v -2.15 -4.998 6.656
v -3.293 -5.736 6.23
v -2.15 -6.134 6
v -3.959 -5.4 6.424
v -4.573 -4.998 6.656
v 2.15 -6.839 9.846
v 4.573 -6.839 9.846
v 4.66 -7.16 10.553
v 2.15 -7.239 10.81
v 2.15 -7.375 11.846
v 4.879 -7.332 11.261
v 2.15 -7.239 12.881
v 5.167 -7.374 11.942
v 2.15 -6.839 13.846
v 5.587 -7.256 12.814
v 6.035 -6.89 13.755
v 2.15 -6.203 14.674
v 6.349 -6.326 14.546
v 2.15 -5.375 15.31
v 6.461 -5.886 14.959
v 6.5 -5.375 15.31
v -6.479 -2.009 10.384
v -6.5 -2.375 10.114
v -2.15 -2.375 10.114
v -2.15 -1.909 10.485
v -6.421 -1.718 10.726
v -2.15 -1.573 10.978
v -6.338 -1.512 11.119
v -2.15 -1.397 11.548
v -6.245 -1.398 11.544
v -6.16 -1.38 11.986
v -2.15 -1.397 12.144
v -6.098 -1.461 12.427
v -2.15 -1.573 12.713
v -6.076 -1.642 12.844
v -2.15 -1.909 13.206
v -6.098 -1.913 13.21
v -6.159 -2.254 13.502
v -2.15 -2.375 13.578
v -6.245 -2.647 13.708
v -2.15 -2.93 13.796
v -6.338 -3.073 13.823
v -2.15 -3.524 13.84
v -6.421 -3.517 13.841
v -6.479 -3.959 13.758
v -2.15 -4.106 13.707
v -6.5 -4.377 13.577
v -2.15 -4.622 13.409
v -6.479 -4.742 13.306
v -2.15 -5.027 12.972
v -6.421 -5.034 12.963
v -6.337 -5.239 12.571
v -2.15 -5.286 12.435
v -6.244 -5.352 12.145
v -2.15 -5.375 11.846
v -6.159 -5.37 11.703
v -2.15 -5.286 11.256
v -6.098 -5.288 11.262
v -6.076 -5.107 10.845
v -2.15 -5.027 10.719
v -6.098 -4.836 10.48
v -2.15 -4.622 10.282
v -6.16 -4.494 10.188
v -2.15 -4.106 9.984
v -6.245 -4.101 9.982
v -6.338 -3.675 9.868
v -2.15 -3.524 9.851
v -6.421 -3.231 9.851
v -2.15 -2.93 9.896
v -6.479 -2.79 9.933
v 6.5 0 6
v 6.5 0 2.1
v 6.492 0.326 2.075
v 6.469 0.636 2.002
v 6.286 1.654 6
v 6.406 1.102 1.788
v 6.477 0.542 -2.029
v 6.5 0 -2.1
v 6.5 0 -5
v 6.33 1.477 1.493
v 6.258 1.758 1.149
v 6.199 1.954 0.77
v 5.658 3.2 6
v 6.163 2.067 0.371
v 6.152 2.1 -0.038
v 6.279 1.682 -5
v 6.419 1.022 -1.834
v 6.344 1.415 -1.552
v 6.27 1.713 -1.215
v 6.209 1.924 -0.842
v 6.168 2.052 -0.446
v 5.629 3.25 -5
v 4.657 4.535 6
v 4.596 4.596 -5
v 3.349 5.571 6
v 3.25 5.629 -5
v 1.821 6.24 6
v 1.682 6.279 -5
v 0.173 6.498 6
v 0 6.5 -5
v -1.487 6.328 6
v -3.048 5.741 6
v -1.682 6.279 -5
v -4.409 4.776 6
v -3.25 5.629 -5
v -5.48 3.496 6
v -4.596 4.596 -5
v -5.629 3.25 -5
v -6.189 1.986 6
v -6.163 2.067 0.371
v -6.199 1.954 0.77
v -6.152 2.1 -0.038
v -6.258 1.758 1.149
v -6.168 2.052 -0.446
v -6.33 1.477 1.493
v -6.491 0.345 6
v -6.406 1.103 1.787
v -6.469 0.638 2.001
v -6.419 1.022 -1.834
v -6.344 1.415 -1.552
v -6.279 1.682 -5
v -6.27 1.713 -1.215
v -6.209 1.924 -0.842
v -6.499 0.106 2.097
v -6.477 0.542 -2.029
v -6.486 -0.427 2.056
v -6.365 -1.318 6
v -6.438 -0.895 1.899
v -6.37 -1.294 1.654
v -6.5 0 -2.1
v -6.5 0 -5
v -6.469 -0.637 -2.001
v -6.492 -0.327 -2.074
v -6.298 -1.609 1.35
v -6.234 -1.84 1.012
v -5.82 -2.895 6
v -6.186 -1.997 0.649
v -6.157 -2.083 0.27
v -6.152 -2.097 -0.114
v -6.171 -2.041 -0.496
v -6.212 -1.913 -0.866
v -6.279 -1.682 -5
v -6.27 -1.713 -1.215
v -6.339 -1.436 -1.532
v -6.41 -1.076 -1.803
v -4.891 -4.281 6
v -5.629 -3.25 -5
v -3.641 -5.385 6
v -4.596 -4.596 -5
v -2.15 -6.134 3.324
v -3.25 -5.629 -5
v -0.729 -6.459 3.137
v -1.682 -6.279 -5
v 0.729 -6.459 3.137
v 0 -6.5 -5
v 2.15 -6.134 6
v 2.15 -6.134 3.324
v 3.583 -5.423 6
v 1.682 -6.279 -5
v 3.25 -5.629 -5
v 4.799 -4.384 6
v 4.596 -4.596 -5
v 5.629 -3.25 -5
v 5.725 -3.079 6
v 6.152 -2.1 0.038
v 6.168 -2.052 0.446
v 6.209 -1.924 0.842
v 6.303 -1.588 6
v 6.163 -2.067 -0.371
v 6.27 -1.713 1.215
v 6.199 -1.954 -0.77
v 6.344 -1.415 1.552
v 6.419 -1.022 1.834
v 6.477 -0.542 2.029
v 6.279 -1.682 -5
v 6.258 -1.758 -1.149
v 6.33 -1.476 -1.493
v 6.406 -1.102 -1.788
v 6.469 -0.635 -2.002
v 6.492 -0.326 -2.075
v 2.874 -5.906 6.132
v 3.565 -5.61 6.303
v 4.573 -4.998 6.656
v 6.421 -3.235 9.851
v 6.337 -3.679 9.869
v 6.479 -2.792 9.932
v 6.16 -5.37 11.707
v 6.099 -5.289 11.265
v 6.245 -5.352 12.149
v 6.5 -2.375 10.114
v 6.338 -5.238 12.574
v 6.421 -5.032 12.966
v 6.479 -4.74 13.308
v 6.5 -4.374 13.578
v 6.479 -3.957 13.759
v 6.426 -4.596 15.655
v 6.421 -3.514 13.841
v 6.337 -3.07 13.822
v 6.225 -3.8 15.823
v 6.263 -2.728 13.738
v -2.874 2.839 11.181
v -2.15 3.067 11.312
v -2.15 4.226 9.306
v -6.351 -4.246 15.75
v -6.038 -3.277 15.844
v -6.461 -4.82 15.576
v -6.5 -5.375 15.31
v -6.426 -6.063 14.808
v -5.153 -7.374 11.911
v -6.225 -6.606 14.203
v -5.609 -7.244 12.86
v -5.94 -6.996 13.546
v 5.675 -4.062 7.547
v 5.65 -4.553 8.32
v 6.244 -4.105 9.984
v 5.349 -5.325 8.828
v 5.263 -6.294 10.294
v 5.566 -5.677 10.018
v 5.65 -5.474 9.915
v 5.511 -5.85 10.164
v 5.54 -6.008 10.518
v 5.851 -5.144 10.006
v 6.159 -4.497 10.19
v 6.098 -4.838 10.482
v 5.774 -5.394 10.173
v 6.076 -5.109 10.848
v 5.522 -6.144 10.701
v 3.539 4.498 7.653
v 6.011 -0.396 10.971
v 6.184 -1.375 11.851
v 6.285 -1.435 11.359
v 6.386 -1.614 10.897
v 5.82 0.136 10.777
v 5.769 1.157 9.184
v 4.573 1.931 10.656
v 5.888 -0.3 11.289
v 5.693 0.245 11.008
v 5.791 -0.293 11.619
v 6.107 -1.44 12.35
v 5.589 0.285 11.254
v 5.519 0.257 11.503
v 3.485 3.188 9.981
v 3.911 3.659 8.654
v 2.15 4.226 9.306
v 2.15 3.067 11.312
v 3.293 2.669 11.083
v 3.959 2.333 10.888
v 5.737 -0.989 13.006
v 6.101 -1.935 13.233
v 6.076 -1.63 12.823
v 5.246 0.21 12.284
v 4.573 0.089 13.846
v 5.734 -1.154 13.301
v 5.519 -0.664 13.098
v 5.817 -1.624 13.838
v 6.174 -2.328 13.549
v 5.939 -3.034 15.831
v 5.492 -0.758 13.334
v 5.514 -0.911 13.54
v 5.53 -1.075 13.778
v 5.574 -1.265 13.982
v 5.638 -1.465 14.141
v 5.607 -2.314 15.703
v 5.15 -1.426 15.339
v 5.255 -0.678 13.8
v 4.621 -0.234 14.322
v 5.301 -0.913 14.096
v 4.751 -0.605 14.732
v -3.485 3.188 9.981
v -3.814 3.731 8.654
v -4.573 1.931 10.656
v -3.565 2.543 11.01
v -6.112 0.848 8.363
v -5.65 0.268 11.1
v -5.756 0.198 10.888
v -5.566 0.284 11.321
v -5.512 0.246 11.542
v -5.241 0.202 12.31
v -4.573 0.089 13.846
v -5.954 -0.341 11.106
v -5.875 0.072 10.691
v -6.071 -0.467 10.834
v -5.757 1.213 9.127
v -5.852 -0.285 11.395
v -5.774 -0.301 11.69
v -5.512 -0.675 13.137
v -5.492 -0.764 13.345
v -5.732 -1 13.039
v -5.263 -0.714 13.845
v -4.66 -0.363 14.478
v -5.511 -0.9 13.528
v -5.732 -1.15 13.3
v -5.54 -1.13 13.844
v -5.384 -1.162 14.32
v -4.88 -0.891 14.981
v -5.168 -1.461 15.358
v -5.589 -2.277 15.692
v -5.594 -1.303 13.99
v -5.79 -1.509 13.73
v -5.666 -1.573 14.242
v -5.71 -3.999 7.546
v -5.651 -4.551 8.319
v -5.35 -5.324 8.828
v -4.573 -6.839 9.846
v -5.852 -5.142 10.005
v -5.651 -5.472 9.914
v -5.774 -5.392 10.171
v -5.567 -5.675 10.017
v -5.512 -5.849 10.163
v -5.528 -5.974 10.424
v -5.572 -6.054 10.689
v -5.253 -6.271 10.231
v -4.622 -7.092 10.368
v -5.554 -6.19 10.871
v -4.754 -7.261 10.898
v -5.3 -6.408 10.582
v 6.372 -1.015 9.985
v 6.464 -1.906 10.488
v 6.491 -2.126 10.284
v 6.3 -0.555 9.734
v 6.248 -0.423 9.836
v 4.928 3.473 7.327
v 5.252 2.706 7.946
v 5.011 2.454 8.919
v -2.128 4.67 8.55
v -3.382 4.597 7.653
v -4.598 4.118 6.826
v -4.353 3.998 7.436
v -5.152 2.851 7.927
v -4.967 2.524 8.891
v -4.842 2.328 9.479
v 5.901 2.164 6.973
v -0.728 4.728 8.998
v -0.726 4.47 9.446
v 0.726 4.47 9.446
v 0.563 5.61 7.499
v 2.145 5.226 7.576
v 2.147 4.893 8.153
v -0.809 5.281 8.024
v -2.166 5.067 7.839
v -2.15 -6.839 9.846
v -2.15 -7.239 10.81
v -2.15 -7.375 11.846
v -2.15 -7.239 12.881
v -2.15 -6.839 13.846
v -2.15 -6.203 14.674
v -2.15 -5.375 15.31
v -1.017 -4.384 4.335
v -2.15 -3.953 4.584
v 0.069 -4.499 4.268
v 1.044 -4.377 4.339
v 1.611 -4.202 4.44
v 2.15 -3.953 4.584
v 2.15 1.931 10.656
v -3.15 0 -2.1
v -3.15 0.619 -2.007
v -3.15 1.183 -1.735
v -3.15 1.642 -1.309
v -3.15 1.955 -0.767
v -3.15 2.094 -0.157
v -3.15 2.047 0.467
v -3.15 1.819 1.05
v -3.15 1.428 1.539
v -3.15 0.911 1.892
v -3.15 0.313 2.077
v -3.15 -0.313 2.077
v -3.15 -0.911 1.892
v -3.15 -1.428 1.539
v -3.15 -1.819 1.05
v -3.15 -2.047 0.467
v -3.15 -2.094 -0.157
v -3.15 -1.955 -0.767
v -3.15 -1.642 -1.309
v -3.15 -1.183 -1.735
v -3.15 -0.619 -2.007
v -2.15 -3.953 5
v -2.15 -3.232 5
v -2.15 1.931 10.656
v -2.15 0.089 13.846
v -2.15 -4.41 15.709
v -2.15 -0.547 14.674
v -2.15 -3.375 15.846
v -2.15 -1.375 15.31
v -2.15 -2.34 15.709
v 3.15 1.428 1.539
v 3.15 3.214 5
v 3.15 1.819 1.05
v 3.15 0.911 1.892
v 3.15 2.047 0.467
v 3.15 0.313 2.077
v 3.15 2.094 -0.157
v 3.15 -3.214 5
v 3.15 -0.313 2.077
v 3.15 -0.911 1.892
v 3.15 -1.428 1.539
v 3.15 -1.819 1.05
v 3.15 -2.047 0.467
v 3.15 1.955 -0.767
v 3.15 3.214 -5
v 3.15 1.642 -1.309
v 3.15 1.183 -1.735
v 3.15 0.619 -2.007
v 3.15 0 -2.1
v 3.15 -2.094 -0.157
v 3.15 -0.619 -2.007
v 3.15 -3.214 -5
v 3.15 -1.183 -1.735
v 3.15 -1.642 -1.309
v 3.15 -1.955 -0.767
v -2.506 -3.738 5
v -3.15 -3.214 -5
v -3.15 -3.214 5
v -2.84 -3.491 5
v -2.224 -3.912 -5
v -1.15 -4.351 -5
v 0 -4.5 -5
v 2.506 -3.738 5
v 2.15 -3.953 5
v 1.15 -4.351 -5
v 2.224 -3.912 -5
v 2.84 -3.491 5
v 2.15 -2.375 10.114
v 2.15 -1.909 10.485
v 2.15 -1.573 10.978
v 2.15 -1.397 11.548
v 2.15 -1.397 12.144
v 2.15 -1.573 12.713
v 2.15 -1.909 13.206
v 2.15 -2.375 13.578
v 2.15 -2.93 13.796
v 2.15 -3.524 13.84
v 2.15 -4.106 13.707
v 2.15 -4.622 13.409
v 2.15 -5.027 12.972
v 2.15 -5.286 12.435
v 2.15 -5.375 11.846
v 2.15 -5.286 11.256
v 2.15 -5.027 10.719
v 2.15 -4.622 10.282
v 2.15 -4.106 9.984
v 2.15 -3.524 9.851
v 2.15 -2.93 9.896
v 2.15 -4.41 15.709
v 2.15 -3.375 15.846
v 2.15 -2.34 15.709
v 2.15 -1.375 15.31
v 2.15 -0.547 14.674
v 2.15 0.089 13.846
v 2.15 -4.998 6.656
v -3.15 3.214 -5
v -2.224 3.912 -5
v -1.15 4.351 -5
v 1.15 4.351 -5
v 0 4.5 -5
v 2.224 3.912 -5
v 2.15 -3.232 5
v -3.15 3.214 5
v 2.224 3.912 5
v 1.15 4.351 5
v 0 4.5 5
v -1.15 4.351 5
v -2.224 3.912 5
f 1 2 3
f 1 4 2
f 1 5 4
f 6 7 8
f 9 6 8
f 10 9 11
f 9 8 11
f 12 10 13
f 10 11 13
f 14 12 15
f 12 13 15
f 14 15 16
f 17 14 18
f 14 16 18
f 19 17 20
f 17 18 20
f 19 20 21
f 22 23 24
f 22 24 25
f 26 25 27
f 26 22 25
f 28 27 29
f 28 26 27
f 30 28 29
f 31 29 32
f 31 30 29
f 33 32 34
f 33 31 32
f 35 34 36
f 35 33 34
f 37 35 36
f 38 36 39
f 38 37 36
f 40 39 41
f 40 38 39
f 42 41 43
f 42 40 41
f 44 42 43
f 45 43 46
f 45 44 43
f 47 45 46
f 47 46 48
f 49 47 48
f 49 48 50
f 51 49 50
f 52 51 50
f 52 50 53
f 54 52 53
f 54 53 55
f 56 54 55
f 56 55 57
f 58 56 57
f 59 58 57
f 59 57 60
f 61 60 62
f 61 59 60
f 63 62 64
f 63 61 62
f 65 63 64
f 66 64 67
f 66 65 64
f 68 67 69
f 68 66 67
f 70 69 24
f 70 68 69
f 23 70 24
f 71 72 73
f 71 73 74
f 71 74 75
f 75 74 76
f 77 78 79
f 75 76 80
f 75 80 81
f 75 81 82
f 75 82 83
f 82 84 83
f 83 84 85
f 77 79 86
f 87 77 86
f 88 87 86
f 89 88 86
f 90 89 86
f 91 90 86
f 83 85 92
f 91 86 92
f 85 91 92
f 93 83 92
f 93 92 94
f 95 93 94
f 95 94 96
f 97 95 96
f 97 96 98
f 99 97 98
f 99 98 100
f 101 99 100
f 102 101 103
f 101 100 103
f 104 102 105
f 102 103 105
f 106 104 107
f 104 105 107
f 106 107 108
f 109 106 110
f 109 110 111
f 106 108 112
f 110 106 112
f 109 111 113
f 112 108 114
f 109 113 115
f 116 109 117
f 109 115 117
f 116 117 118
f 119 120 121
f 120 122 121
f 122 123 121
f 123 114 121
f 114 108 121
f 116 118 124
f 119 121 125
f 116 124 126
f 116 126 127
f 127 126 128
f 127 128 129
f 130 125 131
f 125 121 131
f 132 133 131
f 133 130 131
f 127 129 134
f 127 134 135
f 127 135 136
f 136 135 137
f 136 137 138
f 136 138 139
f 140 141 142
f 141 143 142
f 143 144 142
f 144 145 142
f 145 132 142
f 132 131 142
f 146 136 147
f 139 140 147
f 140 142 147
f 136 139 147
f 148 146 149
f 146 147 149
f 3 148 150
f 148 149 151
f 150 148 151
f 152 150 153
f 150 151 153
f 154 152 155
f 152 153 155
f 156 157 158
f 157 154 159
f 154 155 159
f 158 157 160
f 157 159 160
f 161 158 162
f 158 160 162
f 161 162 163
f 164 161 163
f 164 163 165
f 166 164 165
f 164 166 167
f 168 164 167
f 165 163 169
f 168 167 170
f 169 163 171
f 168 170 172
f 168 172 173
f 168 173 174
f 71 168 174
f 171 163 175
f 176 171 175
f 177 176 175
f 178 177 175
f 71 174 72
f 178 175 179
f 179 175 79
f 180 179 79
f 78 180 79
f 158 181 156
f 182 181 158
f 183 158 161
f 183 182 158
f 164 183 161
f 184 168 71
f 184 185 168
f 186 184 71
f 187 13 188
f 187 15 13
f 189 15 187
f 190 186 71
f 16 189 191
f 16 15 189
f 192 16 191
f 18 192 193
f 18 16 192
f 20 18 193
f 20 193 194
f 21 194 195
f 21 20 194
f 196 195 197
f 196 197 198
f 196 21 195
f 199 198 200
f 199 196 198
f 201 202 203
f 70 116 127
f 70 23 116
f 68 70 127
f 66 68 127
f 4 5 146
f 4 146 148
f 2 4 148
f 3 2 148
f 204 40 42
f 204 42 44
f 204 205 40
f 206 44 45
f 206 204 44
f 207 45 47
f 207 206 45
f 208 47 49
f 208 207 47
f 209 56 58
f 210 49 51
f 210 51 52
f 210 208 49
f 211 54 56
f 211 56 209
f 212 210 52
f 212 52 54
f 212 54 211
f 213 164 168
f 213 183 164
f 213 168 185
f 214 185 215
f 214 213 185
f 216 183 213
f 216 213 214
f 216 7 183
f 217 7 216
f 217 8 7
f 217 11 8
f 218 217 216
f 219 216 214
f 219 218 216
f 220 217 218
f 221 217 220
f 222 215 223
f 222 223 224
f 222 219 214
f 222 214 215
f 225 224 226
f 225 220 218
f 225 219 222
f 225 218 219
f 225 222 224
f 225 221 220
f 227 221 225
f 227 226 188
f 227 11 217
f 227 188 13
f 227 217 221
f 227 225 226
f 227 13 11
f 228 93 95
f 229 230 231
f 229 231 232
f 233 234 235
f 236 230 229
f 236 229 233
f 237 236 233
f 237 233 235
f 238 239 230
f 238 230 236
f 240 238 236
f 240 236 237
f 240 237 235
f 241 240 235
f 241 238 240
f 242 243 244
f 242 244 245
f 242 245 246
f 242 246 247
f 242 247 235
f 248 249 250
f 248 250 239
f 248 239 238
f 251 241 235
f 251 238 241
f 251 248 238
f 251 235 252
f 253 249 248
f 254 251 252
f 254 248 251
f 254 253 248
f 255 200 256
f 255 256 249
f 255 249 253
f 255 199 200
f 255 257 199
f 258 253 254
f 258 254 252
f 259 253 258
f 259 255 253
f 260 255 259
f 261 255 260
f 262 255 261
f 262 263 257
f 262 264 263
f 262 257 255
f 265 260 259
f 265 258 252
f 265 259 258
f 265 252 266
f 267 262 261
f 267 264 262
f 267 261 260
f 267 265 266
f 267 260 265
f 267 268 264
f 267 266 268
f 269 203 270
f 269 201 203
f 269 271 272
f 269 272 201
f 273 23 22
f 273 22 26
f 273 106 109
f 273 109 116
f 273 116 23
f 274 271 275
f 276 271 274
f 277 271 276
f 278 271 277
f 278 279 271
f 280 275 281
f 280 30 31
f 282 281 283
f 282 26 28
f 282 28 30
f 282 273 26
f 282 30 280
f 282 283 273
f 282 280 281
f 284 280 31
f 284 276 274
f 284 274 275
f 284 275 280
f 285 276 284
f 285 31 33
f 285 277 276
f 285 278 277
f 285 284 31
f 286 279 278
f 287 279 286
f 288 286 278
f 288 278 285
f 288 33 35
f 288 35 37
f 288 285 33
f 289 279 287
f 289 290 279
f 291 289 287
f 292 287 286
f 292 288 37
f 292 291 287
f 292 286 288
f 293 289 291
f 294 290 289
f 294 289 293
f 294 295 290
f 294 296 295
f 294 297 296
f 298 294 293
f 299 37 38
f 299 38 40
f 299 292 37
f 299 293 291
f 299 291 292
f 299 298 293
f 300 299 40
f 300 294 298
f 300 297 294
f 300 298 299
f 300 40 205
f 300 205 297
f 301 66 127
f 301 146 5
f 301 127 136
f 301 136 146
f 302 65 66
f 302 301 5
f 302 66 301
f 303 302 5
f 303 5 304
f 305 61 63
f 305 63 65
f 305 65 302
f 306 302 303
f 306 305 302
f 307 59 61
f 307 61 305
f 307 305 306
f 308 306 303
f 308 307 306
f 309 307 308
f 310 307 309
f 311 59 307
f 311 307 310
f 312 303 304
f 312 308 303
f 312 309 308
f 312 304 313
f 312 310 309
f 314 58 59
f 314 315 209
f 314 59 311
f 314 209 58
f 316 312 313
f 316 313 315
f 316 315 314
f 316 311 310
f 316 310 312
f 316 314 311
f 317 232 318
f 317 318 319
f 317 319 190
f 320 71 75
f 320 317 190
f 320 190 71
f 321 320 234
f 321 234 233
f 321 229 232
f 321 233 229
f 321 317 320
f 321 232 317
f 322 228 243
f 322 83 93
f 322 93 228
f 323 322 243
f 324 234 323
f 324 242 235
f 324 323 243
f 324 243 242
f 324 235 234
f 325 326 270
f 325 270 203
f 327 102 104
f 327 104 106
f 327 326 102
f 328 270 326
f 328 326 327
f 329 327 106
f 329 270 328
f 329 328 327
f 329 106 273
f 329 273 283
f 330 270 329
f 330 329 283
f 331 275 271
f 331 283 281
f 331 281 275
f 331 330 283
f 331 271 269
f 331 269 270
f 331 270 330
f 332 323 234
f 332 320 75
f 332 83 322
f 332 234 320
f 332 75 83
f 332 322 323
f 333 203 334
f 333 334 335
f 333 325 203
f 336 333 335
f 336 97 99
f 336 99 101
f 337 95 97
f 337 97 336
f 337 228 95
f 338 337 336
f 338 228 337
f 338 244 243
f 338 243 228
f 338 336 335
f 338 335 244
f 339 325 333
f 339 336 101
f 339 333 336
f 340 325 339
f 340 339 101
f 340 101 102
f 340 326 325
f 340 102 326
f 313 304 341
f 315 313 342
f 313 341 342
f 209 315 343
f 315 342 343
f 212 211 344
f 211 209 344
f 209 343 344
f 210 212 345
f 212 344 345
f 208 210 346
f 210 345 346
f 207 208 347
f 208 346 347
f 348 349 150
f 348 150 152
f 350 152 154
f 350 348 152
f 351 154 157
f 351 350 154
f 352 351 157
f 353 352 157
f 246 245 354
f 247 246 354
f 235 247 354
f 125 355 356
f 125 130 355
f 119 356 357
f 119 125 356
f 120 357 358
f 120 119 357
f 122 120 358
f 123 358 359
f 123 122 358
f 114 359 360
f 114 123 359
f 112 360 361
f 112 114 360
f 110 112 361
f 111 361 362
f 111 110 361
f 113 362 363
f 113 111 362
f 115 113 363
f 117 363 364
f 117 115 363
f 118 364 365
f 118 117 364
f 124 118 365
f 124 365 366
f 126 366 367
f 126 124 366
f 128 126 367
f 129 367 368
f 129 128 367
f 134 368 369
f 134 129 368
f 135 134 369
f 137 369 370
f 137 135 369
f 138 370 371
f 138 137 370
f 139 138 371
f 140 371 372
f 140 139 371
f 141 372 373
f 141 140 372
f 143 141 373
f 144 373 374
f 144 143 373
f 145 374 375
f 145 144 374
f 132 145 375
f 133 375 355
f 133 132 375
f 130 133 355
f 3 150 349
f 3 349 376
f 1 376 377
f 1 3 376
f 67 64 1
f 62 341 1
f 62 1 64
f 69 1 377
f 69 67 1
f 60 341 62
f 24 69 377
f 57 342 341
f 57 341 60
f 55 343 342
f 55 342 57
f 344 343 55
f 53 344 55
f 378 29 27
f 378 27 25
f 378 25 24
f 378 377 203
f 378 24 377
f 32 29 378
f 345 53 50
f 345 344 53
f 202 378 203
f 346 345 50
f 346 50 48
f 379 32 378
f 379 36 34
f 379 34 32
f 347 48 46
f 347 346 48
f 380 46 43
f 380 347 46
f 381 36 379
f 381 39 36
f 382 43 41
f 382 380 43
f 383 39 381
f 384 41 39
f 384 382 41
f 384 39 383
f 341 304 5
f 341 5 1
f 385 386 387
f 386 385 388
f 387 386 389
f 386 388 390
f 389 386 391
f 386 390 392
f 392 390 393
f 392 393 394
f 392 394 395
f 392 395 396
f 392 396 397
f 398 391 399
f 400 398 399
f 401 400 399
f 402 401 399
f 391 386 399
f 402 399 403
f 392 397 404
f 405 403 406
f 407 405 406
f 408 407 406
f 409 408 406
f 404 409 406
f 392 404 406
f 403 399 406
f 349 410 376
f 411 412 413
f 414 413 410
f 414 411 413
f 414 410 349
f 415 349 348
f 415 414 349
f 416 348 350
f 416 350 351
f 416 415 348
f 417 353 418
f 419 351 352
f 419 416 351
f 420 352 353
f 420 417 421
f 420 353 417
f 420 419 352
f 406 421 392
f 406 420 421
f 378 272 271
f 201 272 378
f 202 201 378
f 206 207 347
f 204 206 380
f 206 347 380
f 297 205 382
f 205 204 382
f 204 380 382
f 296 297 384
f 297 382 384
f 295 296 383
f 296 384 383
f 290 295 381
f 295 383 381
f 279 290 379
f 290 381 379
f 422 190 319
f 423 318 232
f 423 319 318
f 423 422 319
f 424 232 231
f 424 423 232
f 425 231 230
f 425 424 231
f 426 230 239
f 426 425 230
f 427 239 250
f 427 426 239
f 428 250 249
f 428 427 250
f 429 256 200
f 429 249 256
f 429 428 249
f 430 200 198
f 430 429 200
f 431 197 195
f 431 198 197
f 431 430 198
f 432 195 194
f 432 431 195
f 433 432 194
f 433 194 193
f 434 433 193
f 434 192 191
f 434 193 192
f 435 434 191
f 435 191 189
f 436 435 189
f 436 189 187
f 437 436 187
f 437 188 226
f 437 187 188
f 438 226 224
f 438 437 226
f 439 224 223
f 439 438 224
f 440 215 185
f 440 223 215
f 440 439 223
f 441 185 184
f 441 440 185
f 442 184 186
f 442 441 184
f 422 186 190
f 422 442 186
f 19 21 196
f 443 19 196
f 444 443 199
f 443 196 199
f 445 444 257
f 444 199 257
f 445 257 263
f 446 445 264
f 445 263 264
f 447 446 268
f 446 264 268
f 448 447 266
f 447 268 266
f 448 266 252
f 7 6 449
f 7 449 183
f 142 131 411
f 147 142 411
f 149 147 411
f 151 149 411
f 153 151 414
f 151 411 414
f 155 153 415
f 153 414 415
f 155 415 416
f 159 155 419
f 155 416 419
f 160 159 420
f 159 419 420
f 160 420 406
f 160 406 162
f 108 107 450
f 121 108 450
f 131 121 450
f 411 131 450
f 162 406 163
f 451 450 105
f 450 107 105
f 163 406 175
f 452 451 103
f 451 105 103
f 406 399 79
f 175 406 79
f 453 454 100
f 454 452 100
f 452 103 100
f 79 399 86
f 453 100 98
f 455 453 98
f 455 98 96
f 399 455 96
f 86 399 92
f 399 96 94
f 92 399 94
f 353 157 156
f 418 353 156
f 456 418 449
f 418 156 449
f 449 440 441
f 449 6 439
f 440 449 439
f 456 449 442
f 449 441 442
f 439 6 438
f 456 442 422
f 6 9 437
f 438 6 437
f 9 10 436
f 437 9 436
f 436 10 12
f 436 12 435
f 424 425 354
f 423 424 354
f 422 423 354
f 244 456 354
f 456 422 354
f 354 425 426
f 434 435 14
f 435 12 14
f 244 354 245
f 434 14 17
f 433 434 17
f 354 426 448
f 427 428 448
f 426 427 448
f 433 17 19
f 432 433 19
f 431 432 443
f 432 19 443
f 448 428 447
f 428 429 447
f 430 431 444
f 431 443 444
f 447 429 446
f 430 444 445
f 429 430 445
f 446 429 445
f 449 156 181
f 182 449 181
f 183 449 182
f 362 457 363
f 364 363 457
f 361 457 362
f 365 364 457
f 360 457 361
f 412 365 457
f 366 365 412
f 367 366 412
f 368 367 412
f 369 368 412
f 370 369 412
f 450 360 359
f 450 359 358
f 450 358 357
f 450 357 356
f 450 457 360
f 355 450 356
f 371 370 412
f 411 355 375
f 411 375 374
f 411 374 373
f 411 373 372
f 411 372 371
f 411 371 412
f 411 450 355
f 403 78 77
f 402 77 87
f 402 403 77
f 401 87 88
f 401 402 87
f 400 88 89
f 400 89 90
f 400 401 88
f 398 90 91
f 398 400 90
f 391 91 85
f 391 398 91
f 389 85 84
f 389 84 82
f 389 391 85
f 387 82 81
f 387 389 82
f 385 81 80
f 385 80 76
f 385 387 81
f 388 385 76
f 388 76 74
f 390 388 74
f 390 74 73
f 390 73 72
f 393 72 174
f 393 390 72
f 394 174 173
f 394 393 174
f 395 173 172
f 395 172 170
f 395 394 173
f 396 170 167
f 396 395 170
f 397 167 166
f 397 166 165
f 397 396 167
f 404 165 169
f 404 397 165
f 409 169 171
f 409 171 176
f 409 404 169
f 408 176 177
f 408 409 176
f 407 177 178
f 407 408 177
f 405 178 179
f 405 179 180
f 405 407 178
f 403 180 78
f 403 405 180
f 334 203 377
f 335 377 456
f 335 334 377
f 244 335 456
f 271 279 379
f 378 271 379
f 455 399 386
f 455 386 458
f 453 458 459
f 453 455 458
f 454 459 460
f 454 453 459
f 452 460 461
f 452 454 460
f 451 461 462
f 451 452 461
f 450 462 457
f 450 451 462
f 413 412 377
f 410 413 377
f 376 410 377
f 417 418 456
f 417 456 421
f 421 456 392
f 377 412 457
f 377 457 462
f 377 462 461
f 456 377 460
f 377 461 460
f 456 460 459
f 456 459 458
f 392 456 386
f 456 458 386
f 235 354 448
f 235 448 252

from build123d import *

# Parameters (mm, degrees)
BOSS_EXTRUDE1_DEPTH      = 5
BOSS_EXTRUDE1_DEPTH_BACK = 5
SKETCH1_R                = 6.5
SKETCH1_R_2              = 4.5
SKETCH2_R                = 6.5
BOSS_EXTRUDE2_DEPTH      = 1
CUT_EXTRUDE1_START       = -8
CUT_EXTRUDE1_DEPTH       = 15
SKETCH6_W                = 4.3
SKETCH6_H                = 17.25833025
CUT_EXTRUDE2_DEPTH       = 10
CUT_EXTRUDE3_DEPTH       = 22.553121401
CUT_EXTRUDE3_DEPTH_BACK  = 22.553121401
SKETCH7_R                = 2
SKETCH8_W                = 9.14694849
SKETCH8_H                = 3.258330249
CUT_EXTRUDE4_DEPTH       = 7.682935
FILLET2_R                = 4
BOSS_EXTRUDE4_REACH      = 25.047
CUT_EXTRUDE5_DEPTH       = 19.647410958
CUT_EXTRUDE5_DEPTH_BACK  = 19.647410958
SKETCH10_R               = 2.1


with BuildPart() as part:
    # Sketch1 → Boss-Extrude1 (new, two sides: drawn at the far end of the back side and taken through both)
    with BuildSketch(Plane.XY.offset(-BOSS_EXTRUDE1_DEPTH_BACK)):
        Circle(SKETCH1_R)
        Circle(SKETCH1_R_2, mode=Mode.SUBTRACT)
    extrude(amount=BOSS_EXTRUDE1_DEPTH + BOSS_EXTRUDE1_DEPTH_BACK)

    # Sketch2 → Boss-Extrude2 (add)
    with BuildSketch(Plane.XY.offset(5)):
        Circle(SKETCH2_R)
    extrude(amount=BOSS_EXTRUDE2_DEPTH)

    # Sweep1: read off the stored shape, not the designer's step
    # Sweep1: loft between two sections, ruled curve by curve
    sweep1_from = [
        Edge.make_bspline([(6.5, 0, 6), (6.5, 13, 6), (-6.5, 13, 6), (-6.5, 0, 6), (-6.5, -13, 6), (6.5, -13, 6), (6.5, 0, 6)], [0, 0, 0, 0, 0.5, 0.5, 0.5, 1, 1, 1, 1], 3, [1, 0.333333333, 0.333333333, 1, 0.333333333, 0.333333333, 1]),
    ]
    sweep1_to = [
        Edge.make_bspline([(6.5, -7, 18.124355653), (6.5, 6, 18.124355653), (-6.5, 6, 18.124355653), (-6.5, -7, 18.124355653), (-6.5, -20, 18.124355653), (6.5, -20, 18.124355653), (6.5, -7, 18.124355653)], [0, 0, 0, 0, 0.5, 0.5, 0.5, 1, 1, 1, 1], 3, [1, 0.333333333, 0.333333333, 1, 0.333333333, 0.333333333, 1]),
    ]
    sweep1 = Solid(Shell([*[Face.make_surface_from_curves(sweep1_from[k], sweep1_to[k]) for k in range(1)], Face(Wire(sweep1_from)), Face(Wire(sweep1_to))]))
    add(sweep1)

    # Cut-Extrude1: read off the stored shape, not the designer's step
    # Cut-Extrude1 outline → Cut-Extrude1 (cut)
    with BuildSketch(Plane(origin=(0, 0, 0), x_dir=(0, 0, -1), z_dir=(1, 0, 0)).offset(CUT_EXTRUDE1_START)):
        Polygon((-12.495190528, -10.25), (-18.124355653, -0.5), (-18.124355653, -13.5), align=None)
    extrude(amount=CUT_EXTRUDE1_DEPTH, mode=Mode.SUBTRACT)

    # Sketch6 → Cut-Extrude2 (cut)
    with BuildSketch(Plane(origin=(0, -7.973076211, 13.809773091), x_dir=(1, 0, 0), z_dir=(0, -0.5000000000000006, 0.8660254037844384))):
        Rectangle(SKETCH6_W, SKETCH6_H)
    extrude(amount=-CUT_EXTRUDE2_DEPTH, mode=Mode.SUBTRACT)

    # Sketch7 → Cut-Extrude3 (cut, two sides: drawn at the far end of the back side and taken through both)
    with BuildSketch(Plane(origin=(0, 0, 0), x_dir=(0, 0, -1), z_dir=(1, 0, 0)).offset(-CUT_EXTRUDE3_DEPTH_BACK)):
        with Locations(Location((-11.845671476, -3.375, 0), (0, 0, 30))):
            Circle(SKETCH7_R)
    extrude(amount=CUT_EXTRUDE3_DEPTH + CUT_EXTRUDE3_DEPTH_BACK, mode=Mode.SUBTRACT)

    # Sketch8 → Cut-Extrude4 (cut)
    with BuildSketch(Plane(origin=(0, -7.973076211, 13.809773091), x_dir=(1, 0, 0), z_dir=(0, -0.5000000000000004, 0.8660254037844384))):
        with Locations((0, 8.629165125)):
            Rectangle(SKETCH8_W, SKETCH8_H)
        with Locations((0, -2.629165125)):
            Rectangle(SKETCH8_W, SKETCH8_H)
    extrude(amount=-CUT_EXTRUDE4_DEPTH, mode=Mode.SUBTRACT)

    # Fillet2
    # the kernel refuses this fillet: 4 mm, written as the material it takes off along each edge
    with BuildSketch(Plane(origin=(14.573474245, -1.910898385, 17.309773091), x_dir=(0, -0.8660254037646593, -0.5000000000342589), z_dir=(-1, 0, 0)), Plane(origin=(7.85, -1.910898385, 17.309773091), x_dir=(0, -0.8660254037646593, -0.5000000000342589), z_dir=(-1, 0, 0)), Plane(origin=(14.573474245, -8.839101615, 13.309773091), x_dir=(0, 0.5000000000000003, -0.8660254037844386), z_dir=(-1, 0, 0))) as fillet2_piece_1:
        with BuildLine():
            CenterArc((FILLET2_R, -FILLET2_R), FILLET2_R, 90, 90.000000002)
            Line((FILLET2_R * 3.95581923922e-11, -FILLET2_R), (0, 0))
            Line((0, 0), (FILLET2_R, 0))
        make_face()
    extrude(amount=22.423474245, mode=Mode.SUBTRACT)
    with BuildSketch(Plane(origin=(7.85, -8.839101615, 13.309773091), x_dir=(0, 0.8660254038042173, 0.49999999996574257), z_dir=(-1, 0, 0))) as fillet2_piece_2:
        with BuildLine():
            CenterArc((FILLET2_R, FILLET2_R), FILLET2_R, 179.999999998, 89.999999998)
            Line((FILLET2_R * 3.95576715485e-11, FILLET2_R), (0, 0))
            Line((0, 0), (FILLET2_R, 0))
        make_face()
    extrude(amount=22.423474245, mode=Mode.SUBTRACT)

    # Sketch9 → Boss-Extrude4 (add, up to next)
    with BuildSketch(Plane(origin=(0, 0, -5), x_dir=(-1, 0, 0), z_dir=(0, 0, -1)), mode=Mode.PRIVATE) as boss_extrude4_sk1:
        with BuildLine():
            Line((-3.15, 3.213642793), (-3.15, -3.213642793))
            ThreePointArc((-3.15, -3.213642793), (-4.5, 0), (-3.15, 3.213642793))
        make_face()
    boss_extrude4_tool1 = extrude(boss_extrude4_sk1.sketch, amount=-BOSS_EXTRUDE4_REACH, mode=Mode.PRIVATE) - part.part
    # Sketch9 → Boss-Extrude4 (add, up to next)
    with BuildSketch(Plane(origin=(0, 0, -5), x_dir=(-1, 0, 0), z_dir=(0, 0, -1)), mode=Mode.PRIVATE) as boss_extrude4_sk2:
        with BuildLine():
            Line((3.15, 3.213642793), (3.15, -3.213642793))
            ThreePointArc((3.15, -3.213642793), (4.5, 0), (3.15, 3.213642793))
        make_face()
    boss_extrude4_tool2 = extrude(boss_extrude4_sk2.sketch, amount=-BOSS_EXTRUDE4_REACH, mode=Mode.PRIVATE) - part.part
    add(boss_extrude4_tool1.solids().sort_by_distance((3.697607, 0, -5))[0])
    add(boss_extrude4_tool2.solids().sort_by_distance((-3.697607, 0, -5))[0])

    # Sketch10 → Cut-Extrude5 (cut, two sides: drawn at the far end of the back side and taken through both)
    with BuildSketch(Plane(origin=(0, 0, 0), x_dir=(0, 0, -1), z_dir=(1, 0, 0)).offset(-CUT_EXTRUDE5_DEPTH_BACK)):
        Circle(SKETCH10_R)
    extrude(amount=CUT_EXTRUDE5_DEPTH + CUT_EXTRUDE5_DEPTH_BACK, mode=Mode.SUBTRACT)


solid = part.part
